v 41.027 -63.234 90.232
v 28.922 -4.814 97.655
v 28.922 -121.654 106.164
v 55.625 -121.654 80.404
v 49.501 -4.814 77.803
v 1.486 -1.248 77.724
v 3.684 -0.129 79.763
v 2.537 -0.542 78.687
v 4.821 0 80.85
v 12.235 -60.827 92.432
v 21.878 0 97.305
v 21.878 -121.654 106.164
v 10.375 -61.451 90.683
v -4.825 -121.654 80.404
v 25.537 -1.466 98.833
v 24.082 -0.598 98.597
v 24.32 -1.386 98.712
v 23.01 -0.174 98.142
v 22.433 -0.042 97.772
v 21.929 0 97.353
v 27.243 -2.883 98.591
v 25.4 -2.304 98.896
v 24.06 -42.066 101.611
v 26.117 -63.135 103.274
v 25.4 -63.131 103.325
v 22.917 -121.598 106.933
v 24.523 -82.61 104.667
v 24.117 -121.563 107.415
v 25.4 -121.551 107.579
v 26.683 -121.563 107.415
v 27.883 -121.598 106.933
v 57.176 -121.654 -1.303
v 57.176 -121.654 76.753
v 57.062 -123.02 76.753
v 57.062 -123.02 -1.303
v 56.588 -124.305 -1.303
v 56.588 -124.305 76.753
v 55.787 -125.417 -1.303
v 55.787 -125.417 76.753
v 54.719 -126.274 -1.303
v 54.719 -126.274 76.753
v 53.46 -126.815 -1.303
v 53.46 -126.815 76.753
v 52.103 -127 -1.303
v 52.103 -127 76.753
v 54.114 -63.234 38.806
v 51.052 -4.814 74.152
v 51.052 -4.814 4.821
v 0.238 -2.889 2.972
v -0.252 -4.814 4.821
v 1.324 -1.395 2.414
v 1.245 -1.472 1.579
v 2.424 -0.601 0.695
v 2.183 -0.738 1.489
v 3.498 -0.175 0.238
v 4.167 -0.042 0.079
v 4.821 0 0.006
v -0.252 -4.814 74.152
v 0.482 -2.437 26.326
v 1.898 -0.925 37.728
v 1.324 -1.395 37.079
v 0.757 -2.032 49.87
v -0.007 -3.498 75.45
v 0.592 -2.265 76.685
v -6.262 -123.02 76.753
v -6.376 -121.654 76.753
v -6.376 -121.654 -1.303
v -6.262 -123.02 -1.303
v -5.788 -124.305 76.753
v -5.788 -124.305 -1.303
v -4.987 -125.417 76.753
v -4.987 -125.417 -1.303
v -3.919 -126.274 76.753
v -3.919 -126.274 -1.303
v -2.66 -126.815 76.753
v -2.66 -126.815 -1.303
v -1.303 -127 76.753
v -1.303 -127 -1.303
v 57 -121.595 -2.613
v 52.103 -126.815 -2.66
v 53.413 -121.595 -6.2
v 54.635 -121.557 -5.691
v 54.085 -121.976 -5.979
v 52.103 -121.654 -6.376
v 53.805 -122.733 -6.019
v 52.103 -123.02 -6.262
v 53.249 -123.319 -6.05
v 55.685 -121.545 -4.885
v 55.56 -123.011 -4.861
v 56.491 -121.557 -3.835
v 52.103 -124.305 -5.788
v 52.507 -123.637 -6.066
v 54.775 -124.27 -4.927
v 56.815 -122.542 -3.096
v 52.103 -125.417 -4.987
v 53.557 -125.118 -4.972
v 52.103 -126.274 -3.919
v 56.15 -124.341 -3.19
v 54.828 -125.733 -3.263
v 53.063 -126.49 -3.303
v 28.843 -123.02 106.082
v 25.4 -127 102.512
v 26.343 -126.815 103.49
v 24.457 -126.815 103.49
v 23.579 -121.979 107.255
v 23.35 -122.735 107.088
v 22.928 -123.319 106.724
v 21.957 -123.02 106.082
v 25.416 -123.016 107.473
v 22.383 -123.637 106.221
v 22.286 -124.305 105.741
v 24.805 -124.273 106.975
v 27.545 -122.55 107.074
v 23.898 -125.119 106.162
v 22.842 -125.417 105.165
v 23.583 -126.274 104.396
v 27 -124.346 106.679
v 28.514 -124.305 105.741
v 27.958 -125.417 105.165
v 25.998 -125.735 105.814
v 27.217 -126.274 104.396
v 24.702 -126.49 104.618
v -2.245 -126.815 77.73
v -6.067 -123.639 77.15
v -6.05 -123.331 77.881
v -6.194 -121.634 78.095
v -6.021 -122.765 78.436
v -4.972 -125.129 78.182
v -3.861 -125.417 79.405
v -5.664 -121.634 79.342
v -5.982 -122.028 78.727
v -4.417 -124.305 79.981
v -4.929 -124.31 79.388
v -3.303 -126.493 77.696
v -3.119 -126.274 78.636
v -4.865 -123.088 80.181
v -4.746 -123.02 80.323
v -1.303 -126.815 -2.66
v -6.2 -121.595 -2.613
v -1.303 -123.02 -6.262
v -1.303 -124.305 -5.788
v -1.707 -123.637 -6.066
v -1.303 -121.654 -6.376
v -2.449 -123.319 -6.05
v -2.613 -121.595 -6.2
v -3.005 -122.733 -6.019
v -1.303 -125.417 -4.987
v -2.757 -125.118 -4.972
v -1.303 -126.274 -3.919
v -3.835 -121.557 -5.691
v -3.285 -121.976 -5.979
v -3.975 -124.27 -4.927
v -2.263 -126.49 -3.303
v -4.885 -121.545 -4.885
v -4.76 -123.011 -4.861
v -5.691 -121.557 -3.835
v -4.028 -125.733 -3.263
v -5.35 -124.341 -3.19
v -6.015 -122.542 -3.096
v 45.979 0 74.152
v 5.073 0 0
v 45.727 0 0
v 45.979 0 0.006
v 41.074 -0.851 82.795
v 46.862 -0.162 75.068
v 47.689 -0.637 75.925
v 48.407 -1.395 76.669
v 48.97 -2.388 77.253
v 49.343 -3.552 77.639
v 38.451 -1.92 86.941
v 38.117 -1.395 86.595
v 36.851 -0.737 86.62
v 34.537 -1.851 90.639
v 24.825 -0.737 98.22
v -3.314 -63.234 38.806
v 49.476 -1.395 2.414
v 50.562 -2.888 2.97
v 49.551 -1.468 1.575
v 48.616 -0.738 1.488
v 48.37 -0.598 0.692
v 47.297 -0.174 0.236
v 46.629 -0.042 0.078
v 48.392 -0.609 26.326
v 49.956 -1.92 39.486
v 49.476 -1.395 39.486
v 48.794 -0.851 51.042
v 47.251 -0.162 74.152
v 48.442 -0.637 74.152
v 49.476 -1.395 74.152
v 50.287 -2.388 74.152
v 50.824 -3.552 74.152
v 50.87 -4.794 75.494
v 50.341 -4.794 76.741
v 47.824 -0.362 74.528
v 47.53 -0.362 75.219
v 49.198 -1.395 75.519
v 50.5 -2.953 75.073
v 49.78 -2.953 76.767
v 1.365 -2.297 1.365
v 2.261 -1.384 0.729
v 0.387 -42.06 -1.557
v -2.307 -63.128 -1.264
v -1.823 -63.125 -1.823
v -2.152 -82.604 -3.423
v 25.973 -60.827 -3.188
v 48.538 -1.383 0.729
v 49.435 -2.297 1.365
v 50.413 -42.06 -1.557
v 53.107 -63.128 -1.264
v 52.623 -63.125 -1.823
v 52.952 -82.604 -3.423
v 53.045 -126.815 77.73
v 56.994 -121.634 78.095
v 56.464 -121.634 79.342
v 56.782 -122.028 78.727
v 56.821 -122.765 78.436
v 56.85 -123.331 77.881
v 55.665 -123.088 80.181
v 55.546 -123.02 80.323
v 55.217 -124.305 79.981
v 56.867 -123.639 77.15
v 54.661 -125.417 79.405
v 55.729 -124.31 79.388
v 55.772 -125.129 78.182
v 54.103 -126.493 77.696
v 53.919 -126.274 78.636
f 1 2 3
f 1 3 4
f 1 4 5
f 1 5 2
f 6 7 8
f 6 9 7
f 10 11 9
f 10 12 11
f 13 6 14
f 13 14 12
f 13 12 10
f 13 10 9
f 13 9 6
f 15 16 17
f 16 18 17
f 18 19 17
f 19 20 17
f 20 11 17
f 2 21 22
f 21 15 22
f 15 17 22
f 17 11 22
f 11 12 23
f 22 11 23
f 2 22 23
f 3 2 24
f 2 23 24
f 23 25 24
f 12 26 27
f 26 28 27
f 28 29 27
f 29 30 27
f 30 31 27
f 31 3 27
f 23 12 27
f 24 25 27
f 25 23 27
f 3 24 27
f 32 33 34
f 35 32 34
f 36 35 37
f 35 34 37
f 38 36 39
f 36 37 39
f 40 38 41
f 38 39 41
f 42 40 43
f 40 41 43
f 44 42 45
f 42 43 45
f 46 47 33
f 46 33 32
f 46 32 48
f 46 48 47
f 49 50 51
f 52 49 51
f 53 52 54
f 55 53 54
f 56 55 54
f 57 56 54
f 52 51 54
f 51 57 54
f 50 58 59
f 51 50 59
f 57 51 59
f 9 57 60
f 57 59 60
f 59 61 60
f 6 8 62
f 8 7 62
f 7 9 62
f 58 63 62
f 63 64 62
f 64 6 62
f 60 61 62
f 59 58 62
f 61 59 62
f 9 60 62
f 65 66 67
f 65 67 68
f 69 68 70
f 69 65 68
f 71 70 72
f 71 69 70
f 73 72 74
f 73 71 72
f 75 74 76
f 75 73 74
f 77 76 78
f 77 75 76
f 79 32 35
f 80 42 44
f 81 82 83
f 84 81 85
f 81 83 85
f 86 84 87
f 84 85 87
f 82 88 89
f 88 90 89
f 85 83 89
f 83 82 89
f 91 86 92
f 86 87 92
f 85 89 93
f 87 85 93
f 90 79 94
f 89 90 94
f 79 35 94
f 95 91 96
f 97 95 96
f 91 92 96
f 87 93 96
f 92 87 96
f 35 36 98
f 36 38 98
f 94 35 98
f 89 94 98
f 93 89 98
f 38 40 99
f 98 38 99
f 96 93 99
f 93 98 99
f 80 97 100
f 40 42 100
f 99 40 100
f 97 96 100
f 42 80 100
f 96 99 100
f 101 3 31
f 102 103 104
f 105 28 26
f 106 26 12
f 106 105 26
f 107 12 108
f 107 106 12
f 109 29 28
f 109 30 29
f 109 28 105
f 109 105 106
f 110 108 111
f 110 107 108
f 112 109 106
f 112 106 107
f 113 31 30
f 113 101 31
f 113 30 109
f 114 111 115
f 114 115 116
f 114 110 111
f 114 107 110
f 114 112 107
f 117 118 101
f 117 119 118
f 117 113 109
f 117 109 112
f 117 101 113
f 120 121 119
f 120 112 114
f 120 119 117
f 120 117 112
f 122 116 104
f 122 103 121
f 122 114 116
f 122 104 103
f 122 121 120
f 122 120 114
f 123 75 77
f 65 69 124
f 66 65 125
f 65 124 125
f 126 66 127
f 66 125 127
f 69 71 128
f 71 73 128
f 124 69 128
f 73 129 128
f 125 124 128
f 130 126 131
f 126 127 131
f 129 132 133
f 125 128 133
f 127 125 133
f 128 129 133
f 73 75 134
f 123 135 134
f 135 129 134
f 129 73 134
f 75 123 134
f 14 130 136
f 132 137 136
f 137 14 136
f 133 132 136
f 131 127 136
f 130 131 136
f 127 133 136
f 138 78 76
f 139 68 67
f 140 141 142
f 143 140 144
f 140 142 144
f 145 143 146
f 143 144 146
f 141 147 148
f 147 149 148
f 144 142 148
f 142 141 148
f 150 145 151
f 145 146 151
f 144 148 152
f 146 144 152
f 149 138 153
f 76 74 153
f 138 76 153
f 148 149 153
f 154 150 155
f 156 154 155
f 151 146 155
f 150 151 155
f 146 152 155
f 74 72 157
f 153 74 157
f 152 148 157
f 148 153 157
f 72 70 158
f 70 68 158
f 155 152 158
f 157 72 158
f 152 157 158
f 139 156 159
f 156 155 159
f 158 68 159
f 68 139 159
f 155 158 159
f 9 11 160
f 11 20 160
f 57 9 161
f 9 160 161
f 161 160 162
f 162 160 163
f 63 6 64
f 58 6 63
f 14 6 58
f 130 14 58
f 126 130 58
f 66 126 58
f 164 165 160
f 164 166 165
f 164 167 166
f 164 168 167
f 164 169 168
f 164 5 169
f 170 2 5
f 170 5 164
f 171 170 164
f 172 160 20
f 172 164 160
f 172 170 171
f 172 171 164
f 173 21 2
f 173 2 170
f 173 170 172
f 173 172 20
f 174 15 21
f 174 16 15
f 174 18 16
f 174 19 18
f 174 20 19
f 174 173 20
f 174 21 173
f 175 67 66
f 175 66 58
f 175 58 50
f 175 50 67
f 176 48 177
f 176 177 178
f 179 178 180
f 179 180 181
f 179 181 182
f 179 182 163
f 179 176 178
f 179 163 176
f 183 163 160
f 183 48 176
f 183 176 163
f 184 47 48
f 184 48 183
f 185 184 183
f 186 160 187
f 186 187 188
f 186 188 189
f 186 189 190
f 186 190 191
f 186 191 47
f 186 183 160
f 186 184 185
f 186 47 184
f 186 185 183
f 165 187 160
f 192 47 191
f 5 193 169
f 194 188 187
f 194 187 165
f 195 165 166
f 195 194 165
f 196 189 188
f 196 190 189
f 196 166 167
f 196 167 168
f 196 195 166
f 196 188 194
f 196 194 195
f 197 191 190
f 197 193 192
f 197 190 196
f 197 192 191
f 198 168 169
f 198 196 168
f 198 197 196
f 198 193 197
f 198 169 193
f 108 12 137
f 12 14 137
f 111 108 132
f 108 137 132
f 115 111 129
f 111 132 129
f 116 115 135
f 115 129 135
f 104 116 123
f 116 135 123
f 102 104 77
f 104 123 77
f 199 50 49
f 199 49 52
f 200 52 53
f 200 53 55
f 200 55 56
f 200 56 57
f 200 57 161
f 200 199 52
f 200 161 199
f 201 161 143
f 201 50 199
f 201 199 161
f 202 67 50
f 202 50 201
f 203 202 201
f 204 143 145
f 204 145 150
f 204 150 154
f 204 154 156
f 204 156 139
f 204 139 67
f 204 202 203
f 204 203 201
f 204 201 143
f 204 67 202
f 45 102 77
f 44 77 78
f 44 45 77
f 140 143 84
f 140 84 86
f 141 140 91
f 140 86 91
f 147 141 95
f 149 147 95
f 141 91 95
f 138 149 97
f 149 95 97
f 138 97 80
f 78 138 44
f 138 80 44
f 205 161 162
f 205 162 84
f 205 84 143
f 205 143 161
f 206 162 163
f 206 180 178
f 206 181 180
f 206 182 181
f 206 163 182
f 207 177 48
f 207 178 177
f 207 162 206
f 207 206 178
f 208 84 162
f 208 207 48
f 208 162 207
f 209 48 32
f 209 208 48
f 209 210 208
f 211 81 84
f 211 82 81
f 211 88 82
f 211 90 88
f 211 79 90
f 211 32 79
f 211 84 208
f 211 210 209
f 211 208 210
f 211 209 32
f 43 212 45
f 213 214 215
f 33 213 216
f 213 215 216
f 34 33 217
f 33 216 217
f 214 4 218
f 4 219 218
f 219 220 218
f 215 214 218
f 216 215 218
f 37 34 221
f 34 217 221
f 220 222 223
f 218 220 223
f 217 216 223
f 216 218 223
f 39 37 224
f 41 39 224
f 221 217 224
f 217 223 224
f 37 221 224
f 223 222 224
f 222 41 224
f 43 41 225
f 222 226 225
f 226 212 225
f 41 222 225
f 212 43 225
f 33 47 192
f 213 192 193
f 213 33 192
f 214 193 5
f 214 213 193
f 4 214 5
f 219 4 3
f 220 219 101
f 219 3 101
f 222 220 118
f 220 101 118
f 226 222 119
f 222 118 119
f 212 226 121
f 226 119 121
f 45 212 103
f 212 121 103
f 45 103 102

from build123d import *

# Parameters (mm, degrees)
F0_W     = 50.8
F0_H     = 76.2
F1_DEPTH = 127
F1_TAPER = -3
F2_R     = 5.08


with BuildPart() as f1:
    # F0 (on Front) → F1 (new body)
    with BuildSketch(Plane.XZ):
        Polygon((25.4, 100.702598691), (0, 76.2), (50.8, 76.2), align=None)
        with Locations((25.4, 38.1)):
            Rectangle(F0_W, F0_H)
    extrude(amount=F1_DEPTH, taper=F1_TAPER)

    # F2
    f2_edges = [f1.edges().sort_by_distance(p)[0] for p in [
        (41.427894, -127, 94.488904),
        (54.127894, -63.5, 77.613644),
        (57.455788, -127, 36.18575),
        (50.8, 0, 38.1),
        (38.1, 0, 88.451299),
        (25.4, -63.5, 105.326559),
        (54.127894, -63.5, -3.327894),
        (9.372106, -127, 94.488904),
        (-6.655788, -127, 36.18575),
        (25.4, -127, -6.655788),
        (0, 0, 38.1),
        (-3.327894, -63.5, -3.327894),
        (-3.327894, -63.5, 77.613644),
    ]]
    fillet(f2_edges, radius=F2_R)


solid = f1.part
